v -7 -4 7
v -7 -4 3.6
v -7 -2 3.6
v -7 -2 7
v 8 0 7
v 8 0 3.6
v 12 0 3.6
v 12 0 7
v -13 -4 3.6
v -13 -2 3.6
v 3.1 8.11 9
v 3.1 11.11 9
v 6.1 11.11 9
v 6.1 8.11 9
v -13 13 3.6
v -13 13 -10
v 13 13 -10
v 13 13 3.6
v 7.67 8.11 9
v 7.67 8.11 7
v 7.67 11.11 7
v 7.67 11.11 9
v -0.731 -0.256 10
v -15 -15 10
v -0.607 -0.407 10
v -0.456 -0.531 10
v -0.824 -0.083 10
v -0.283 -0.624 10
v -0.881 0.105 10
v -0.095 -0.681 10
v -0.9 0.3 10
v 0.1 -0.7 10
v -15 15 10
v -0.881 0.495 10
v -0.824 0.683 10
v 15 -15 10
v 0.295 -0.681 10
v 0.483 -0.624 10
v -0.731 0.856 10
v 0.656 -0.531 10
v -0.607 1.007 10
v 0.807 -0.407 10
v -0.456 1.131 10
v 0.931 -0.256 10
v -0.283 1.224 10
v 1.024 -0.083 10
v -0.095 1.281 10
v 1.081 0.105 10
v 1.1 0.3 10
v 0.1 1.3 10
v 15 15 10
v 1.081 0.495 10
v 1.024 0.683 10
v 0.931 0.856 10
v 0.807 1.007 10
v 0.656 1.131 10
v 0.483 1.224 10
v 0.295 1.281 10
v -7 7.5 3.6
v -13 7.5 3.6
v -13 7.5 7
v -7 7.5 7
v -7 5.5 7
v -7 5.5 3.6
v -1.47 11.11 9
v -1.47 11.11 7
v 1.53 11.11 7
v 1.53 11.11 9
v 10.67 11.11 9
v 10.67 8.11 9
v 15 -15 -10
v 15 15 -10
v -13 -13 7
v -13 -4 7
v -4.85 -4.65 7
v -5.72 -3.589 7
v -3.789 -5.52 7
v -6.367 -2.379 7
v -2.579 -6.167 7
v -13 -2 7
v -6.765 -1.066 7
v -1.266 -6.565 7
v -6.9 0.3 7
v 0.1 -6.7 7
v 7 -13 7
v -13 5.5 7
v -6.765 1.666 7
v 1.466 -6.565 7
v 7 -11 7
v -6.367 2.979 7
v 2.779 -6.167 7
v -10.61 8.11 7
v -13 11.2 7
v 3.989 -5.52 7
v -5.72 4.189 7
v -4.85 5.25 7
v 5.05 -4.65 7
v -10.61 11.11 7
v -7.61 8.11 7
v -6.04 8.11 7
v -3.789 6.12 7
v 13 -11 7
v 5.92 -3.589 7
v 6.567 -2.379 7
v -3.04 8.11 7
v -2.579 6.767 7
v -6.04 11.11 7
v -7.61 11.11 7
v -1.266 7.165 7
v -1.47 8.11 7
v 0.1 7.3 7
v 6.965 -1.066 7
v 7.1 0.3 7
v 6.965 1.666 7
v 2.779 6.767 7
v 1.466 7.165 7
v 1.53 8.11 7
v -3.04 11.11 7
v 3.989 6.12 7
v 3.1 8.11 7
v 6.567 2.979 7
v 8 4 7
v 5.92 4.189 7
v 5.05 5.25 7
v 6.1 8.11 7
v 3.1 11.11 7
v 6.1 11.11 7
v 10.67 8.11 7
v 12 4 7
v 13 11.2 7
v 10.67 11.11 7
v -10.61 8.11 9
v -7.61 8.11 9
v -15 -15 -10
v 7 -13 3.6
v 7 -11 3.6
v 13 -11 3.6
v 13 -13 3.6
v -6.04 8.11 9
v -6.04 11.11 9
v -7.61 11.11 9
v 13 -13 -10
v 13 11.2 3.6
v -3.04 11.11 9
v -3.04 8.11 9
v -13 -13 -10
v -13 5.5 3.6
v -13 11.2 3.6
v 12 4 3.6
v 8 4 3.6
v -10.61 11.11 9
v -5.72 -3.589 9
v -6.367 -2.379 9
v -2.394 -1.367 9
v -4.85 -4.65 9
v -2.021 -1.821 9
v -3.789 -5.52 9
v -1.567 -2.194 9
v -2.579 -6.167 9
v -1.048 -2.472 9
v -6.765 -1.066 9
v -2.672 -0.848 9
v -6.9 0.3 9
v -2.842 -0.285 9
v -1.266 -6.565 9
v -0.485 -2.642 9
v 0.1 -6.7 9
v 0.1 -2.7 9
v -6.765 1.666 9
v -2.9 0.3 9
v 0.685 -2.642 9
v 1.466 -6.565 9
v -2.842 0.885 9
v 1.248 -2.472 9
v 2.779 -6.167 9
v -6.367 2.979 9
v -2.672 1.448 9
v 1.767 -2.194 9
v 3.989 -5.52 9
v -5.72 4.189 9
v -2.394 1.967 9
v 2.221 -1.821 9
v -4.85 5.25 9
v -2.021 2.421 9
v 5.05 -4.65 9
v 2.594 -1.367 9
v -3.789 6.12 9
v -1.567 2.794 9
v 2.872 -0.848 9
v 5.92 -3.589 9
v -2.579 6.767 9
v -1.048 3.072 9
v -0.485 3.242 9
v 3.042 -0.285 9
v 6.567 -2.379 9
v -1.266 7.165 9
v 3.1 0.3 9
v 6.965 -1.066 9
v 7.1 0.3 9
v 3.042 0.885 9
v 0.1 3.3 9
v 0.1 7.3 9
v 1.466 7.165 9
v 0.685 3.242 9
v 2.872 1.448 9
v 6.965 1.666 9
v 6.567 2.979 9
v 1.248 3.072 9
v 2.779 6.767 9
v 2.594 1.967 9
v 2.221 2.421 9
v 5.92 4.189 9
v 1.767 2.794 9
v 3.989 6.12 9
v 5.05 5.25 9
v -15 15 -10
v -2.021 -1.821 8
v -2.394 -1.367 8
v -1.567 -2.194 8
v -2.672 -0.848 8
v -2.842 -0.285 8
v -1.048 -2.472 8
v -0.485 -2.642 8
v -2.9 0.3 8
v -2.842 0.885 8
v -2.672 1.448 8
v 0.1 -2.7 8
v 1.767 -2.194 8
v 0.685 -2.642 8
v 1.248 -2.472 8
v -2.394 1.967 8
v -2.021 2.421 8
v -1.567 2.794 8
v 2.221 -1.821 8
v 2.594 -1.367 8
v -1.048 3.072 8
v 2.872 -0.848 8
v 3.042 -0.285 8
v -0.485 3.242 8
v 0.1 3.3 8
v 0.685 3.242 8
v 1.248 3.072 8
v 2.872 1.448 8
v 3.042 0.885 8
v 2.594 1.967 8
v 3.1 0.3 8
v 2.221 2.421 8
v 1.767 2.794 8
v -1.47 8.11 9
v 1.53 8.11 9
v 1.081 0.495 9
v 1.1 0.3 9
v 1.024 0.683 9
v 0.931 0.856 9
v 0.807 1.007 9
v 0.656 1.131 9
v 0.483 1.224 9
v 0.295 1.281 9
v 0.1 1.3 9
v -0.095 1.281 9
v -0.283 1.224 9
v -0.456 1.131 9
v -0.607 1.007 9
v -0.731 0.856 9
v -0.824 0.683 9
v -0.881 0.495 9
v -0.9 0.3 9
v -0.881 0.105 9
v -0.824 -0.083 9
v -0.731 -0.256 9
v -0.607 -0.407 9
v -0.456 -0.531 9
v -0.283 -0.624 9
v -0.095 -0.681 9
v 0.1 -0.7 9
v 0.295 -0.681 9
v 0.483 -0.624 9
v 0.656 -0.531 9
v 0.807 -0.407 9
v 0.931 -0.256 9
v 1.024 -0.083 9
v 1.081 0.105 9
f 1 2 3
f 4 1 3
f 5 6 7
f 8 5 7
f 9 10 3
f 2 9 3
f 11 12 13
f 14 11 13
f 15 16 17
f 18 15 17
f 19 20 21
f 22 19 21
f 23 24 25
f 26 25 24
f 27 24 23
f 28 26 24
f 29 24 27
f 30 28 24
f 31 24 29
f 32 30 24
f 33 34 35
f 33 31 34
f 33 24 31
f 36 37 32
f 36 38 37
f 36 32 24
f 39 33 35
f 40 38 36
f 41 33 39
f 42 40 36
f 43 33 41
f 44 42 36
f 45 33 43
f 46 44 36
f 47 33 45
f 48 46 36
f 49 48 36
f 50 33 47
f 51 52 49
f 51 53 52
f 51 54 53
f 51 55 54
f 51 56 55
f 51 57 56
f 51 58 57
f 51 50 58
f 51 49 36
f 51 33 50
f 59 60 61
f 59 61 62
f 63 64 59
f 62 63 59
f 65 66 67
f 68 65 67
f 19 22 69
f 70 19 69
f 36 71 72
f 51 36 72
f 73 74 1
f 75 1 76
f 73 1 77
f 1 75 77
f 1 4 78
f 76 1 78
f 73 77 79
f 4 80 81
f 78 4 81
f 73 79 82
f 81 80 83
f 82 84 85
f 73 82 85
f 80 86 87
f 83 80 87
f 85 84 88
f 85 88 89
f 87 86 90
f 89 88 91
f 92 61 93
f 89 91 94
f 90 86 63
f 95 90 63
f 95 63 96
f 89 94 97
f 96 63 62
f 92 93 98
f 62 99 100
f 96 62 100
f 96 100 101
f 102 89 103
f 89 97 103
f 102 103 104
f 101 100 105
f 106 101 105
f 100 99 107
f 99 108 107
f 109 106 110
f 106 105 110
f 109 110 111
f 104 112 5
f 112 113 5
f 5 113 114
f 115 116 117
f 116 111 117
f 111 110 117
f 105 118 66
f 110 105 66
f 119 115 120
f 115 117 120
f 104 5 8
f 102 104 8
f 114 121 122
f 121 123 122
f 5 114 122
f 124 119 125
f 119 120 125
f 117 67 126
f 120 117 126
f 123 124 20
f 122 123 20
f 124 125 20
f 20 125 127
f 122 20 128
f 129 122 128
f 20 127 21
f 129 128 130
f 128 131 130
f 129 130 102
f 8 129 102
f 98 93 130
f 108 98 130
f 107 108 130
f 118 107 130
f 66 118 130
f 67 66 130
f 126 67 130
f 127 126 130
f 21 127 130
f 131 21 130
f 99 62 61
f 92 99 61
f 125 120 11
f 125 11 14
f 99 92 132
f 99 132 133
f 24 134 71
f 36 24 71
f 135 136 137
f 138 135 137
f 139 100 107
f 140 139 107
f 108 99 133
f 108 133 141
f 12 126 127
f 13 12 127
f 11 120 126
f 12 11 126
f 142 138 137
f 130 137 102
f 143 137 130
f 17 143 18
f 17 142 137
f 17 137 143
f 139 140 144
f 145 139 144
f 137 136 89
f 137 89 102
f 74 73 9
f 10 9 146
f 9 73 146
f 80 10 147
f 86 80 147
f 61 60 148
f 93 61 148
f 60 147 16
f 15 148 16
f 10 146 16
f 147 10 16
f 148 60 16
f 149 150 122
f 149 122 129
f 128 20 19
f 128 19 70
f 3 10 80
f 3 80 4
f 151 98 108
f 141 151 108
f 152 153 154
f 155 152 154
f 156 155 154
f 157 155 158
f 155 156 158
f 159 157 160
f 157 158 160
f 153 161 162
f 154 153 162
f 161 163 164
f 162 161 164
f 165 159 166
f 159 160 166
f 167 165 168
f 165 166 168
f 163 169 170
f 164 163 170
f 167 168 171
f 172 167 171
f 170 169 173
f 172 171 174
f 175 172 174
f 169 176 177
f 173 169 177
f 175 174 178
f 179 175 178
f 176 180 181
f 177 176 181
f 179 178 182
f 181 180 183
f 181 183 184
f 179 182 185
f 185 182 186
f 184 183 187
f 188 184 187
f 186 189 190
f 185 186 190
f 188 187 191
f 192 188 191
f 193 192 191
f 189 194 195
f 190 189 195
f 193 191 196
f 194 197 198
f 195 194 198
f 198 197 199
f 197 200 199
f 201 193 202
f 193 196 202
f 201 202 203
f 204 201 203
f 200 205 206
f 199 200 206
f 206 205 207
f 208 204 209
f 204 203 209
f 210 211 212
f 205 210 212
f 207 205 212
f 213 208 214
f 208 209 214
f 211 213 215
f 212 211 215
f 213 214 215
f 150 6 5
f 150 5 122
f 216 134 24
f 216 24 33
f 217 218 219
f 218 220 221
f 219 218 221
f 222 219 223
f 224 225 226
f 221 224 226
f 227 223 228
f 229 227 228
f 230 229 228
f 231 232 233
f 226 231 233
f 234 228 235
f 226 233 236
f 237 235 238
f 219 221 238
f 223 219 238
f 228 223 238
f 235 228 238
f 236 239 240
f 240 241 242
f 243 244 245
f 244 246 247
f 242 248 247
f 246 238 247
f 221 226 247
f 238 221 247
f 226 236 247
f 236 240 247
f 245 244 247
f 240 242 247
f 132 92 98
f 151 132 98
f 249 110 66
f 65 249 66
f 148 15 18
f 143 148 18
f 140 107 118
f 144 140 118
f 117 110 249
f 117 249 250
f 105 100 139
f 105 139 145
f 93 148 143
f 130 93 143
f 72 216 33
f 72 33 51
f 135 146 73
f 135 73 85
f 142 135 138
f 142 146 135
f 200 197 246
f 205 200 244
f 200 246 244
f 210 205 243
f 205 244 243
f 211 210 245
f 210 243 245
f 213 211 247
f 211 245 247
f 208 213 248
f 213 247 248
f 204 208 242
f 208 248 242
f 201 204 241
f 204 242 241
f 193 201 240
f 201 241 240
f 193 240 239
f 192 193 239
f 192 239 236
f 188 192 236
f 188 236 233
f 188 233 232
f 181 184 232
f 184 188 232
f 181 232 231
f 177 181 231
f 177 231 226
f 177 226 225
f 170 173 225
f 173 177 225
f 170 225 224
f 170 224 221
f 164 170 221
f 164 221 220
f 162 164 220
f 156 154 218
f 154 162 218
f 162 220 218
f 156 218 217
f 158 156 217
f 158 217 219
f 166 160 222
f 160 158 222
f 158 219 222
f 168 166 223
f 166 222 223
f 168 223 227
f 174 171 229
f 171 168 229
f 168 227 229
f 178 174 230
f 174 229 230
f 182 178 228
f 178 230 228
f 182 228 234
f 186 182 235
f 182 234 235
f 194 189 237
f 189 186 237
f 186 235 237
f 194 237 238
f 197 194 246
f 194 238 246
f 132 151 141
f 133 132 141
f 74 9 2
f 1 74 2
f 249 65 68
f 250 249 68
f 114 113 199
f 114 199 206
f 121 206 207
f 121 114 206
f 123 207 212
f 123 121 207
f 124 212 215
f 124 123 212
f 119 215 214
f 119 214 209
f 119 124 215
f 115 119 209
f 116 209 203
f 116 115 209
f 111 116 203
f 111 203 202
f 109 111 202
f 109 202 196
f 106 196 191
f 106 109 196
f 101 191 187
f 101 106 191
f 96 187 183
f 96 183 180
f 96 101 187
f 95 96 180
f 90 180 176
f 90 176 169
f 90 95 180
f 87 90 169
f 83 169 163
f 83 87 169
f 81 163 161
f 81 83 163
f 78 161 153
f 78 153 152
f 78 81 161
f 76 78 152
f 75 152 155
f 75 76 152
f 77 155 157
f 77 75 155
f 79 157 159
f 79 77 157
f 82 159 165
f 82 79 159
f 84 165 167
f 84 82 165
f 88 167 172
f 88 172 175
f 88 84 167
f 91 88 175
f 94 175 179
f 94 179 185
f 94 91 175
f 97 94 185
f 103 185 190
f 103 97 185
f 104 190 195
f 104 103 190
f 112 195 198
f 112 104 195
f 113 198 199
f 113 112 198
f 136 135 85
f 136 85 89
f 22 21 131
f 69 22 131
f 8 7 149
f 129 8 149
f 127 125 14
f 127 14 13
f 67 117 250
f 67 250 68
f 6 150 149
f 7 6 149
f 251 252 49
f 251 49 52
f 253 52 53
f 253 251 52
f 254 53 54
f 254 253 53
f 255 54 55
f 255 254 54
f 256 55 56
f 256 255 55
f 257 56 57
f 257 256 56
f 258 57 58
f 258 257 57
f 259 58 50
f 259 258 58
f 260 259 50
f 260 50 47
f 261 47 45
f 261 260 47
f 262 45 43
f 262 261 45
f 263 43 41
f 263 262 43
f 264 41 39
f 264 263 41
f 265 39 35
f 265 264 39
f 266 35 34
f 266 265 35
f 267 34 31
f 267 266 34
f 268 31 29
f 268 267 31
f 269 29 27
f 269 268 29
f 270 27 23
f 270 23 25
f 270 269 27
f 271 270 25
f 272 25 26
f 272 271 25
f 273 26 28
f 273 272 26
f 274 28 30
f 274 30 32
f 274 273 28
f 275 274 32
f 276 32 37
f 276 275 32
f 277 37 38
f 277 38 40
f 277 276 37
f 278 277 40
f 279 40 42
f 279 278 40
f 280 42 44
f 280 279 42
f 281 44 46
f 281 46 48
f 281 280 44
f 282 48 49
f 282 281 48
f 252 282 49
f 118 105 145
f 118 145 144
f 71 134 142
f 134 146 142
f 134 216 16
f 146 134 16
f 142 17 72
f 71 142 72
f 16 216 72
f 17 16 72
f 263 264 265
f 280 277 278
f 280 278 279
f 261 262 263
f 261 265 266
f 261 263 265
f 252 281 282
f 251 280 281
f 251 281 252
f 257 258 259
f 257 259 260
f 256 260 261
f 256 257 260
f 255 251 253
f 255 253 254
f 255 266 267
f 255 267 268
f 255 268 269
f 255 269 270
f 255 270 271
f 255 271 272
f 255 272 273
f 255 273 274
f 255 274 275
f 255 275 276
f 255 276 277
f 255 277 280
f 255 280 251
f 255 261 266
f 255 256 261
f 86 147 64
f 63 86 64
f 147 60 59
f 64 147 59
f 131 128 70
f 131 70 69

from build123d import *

# Parameters (mm, degrees)
CYLINDER002_R     = 1
CYLINDER002_DEPTH = 1
BOX006_W          = 3
BOX006_H          = 3
BOX006_DEPTH      = 2
BOX005_W          = 3
BOX005_H          = 3
BOX005_DEPTH      = 2
BOX003_W          = 3
BOX003_H          = 3
BOX003_DEPTH      = 2
BOX004_W          = 3
BOX004_H          = 3
BOX004_DEPTH      = 2
BOX002_W          = 3
BOX002_H          = 3
BOX002_DEPTH      = 2
CYLINDER_R        = 7
CYLINDER_DEPTH    = 2
BOX_W             = 26
BOX_H             = 26
BOX_DEPTH         = 17
BOX001_W          = 30
BOX001_H          = 30
BOX001_DEPTH      = 20
CYLINDER001_R     = 3
CYLINDER001_DEPTH = 2
BOX010_W          = 6
BOX010_H          = 2
BOX010_DEPTH      = 3.4
BOX008_W          = 4
BOX008_H          = 4
BOX008_DEPTH      = 3.4
BOX007_W          = 26
BOX007_H          = 1.8
BOX007_DEPTH      = 3.4
BOX009_W          = 6
BOX009_H          = 2
BOX009_DEPTH      = 3.4
BOX011_W          = 6
BOX011_H          = 2
BOX011_DEPTH      = 3.4


with BuildPart() as buttouch001:
    # Cylinder002 → Cylinder002 (new body)
    with BuildSketch(Plane(origin=(0.1, 0.3, 9), x_dir=(1, 0, 0), z_dir=(0, 0, 1))):
        Circle(CYLINDER002_R)
    extrude(amount=CYLINDER002_DEPTH)


with BuildPart() as l5:
    # Box006 → Box006 (new body)
    with BuildSketch(Plane(origin=(7.67, 8.11, 7), x_dir=(1, 0, 0), z_dir=(0, 0, 1))):
        with Locations((1.5, 1.5)):
            Rectangle(BOX006_W, BOX006_H)
    extrude(amount=BOX006_DEPTH)


with BuildPart() as l4:
    # Box005 → Box005 (new body)
    with BuildSketch(Plane(origin=(3.1, 8.11, 7), x_dir=(1, 0, 0), z_dir=(0, 0, 1))):
        with Locations((1.5, 1.5)):
            Rectangle(BOX005_W, BOX005_H)
    extrude(amount=BOX005_DEPTH)


with BuildPart() as l2:
    # Box003 → Box003 (new body)
    with BuildSketch(Plane(origin=(-6.04, 8.11, 7), x_dir=(1, 0, 0), z_dir=(0, 0, 1))):
        with Locations((1.5, 1.5)):
            Rectangle(BOX003_W, BOX003_H)
    extrude(amount=BOX003_DEPTH)


with BuildPart() as l3:
    # Box004 → Box004 (new body)
    with BuildSketch(Plane(origin=(-1.47, 8.11, 7), x_dir=(1, 0, 0), z_dir=(0, 0, 1))):
        with Locations((1.5, 1.5)):
            Rectangle(BOX004_W, BOX004_H)
    extrude(amount=BOX004_DEPTH)


with BuildPart() as fusion:
    # Box002 → Box002 (new body)
    with BuildSketch(Plane(origin=(-10.61, 8.11, 7), x_dir=(1, 0, 0), z_dir=(0, 0, 1))):
        with Locations((1.5, 1.5)):
            Rectangle(BOX002_W, BOX002_H)
    extrude(amount=BOX002_DEPTH)

    # Fusion: union L5, L4, L2, L3
    add(l5.part)
    add(l4.part)
    add(l2.part)
    add(l3.part)


with BuildPart() as but:
    # Cylinder → Cylinder (new body)
    with BuildSketch(Plane(origin=(0.1, 0.3, 7), x_dir=(1, 0, 0), z_dir=(0, 0, 1))):
        Circle(CYLINDER_R)
    extrude(amount=CYLINDER_DEPTH)


with BuildPart() as maininside:
    # Box → Box (new body)
    with BuildSketch(Plane(origin=(-13, -13, -10), x_dir=(1, 0, 0), z_dir=(0, 0, 1))):
        with Locations((13, 13)):
            Rectangle(BOX_W, BOX_H)
    extrude(amount=BOX_DEPTH)


with BuildPart() as cut002:
    # Box001 → Box001 (new body)
    with BuildSketch(Plane(origin=(-15, -15, -10), x_dir=(1, 0, 0), z_dir=(0, 0, 1))):
        with Locations((15, 15)):
            Rectangle(BOX001_W, BOX001_H)
    extrude(amount=BOX001_DEPTH)

    # Cut: cut MainInside
    add(maininside.part, mode=Mode.SUBTRACT)

    # Cut001: cut But
    add(but.part, mode=Mode.SUBTRACT)

    # Cut002: cut Fusion
    add(fusion.part, mode=Mode.SUBTRACT)


with BuildPart() as cut003:
    # Cylinder001 → Cylinder001 (new body)
    with BuildSketch(Plane(origin=(0.1, 0.3, 8), x_dir=(1, 0, 0), z_dir=(0, 0, 1))):
        Circle(CYLINDER001_R)
    extrude(amount=CYLINDER001_DEPTH)

    # Fusion001: union Cut002
    add(cut002.part)

    # Cut003: cut ButTouch001
    add(buttouch001.part, mode=Mode.SUBTRACT)


with BuildPart() as cubedestek4:
    # Box010 → Box010 (new body)
    with BuildSketch(Plane(origin=(-13, 5.5, 3.6), x_dir=(1, 0, 0), z_dir=(0, 0, 1))):
        with Locations((3, 1)):
            Rectangle(BOX010_W, BOX010_H)
    extrude(amount=BOX010_DEPTH)


with BuildPart() as cubedestek2:
    # Box008 → Box008 (new body)
    with BuildSketch(Plane(origin=(8, 0, 3.6), x_dir=(1, 0, 0), z_dir=(0, 0, 1))):
        with Locations((2, 2)):
            Rectangle(BOX008_W, BOX008_H)
    extrude(amount=BOX008_DEPTH)


with BuildPart() as cubedestek:
    # Box007 → Box007 (new body)
    with BuildSketch(Plane(origin=(-13, 11.2, 3.6), x_dir=(1, 0, 0), z_dir=(0, 0, 1))):
        with Locations((13, 0.9)):
            Rectangle(BOX007_W, BOX007_H)
    extrude(amount=BOX007_DEPTH)


with BuildPart() as cubedestek3:
    # Box009 → Box009 (new body)
    with BuildSketch(Plane(origin=(-13, -4, 3.6), x_dir=(1, 0, 0), z_dir=(0, 0, 1))):
        with Locations((3, 1)):
            Rectangle(BOX009_W, BOX009_H)
    extrude(amount=BOX009_DEPTH)


with BuildPart() as fusion003:
    # Box011 → Box011 (new body)
    with BuildSketch(Plane(origin=(7, -13, 3.6), x_dir=(1, 0, 0), z_dir=(0, 0, 1))):
        with Locations((3, 1)):
            Rectangle(BOX011_W, BOX011_H)
    extrude(amount=BOX011_DEPTH)

    # Fusion002: union CubeDestek4, CubeDestek2, CubeDestek, CubeDestek3
    add(cubedestek4.part)
    add(cubedestek2.part)
    add(cubedestek.part)
    add(cubedestek3.part)

    # Fusion003: union Cut003
    add(cut003.part)


solid = fusion003.part
